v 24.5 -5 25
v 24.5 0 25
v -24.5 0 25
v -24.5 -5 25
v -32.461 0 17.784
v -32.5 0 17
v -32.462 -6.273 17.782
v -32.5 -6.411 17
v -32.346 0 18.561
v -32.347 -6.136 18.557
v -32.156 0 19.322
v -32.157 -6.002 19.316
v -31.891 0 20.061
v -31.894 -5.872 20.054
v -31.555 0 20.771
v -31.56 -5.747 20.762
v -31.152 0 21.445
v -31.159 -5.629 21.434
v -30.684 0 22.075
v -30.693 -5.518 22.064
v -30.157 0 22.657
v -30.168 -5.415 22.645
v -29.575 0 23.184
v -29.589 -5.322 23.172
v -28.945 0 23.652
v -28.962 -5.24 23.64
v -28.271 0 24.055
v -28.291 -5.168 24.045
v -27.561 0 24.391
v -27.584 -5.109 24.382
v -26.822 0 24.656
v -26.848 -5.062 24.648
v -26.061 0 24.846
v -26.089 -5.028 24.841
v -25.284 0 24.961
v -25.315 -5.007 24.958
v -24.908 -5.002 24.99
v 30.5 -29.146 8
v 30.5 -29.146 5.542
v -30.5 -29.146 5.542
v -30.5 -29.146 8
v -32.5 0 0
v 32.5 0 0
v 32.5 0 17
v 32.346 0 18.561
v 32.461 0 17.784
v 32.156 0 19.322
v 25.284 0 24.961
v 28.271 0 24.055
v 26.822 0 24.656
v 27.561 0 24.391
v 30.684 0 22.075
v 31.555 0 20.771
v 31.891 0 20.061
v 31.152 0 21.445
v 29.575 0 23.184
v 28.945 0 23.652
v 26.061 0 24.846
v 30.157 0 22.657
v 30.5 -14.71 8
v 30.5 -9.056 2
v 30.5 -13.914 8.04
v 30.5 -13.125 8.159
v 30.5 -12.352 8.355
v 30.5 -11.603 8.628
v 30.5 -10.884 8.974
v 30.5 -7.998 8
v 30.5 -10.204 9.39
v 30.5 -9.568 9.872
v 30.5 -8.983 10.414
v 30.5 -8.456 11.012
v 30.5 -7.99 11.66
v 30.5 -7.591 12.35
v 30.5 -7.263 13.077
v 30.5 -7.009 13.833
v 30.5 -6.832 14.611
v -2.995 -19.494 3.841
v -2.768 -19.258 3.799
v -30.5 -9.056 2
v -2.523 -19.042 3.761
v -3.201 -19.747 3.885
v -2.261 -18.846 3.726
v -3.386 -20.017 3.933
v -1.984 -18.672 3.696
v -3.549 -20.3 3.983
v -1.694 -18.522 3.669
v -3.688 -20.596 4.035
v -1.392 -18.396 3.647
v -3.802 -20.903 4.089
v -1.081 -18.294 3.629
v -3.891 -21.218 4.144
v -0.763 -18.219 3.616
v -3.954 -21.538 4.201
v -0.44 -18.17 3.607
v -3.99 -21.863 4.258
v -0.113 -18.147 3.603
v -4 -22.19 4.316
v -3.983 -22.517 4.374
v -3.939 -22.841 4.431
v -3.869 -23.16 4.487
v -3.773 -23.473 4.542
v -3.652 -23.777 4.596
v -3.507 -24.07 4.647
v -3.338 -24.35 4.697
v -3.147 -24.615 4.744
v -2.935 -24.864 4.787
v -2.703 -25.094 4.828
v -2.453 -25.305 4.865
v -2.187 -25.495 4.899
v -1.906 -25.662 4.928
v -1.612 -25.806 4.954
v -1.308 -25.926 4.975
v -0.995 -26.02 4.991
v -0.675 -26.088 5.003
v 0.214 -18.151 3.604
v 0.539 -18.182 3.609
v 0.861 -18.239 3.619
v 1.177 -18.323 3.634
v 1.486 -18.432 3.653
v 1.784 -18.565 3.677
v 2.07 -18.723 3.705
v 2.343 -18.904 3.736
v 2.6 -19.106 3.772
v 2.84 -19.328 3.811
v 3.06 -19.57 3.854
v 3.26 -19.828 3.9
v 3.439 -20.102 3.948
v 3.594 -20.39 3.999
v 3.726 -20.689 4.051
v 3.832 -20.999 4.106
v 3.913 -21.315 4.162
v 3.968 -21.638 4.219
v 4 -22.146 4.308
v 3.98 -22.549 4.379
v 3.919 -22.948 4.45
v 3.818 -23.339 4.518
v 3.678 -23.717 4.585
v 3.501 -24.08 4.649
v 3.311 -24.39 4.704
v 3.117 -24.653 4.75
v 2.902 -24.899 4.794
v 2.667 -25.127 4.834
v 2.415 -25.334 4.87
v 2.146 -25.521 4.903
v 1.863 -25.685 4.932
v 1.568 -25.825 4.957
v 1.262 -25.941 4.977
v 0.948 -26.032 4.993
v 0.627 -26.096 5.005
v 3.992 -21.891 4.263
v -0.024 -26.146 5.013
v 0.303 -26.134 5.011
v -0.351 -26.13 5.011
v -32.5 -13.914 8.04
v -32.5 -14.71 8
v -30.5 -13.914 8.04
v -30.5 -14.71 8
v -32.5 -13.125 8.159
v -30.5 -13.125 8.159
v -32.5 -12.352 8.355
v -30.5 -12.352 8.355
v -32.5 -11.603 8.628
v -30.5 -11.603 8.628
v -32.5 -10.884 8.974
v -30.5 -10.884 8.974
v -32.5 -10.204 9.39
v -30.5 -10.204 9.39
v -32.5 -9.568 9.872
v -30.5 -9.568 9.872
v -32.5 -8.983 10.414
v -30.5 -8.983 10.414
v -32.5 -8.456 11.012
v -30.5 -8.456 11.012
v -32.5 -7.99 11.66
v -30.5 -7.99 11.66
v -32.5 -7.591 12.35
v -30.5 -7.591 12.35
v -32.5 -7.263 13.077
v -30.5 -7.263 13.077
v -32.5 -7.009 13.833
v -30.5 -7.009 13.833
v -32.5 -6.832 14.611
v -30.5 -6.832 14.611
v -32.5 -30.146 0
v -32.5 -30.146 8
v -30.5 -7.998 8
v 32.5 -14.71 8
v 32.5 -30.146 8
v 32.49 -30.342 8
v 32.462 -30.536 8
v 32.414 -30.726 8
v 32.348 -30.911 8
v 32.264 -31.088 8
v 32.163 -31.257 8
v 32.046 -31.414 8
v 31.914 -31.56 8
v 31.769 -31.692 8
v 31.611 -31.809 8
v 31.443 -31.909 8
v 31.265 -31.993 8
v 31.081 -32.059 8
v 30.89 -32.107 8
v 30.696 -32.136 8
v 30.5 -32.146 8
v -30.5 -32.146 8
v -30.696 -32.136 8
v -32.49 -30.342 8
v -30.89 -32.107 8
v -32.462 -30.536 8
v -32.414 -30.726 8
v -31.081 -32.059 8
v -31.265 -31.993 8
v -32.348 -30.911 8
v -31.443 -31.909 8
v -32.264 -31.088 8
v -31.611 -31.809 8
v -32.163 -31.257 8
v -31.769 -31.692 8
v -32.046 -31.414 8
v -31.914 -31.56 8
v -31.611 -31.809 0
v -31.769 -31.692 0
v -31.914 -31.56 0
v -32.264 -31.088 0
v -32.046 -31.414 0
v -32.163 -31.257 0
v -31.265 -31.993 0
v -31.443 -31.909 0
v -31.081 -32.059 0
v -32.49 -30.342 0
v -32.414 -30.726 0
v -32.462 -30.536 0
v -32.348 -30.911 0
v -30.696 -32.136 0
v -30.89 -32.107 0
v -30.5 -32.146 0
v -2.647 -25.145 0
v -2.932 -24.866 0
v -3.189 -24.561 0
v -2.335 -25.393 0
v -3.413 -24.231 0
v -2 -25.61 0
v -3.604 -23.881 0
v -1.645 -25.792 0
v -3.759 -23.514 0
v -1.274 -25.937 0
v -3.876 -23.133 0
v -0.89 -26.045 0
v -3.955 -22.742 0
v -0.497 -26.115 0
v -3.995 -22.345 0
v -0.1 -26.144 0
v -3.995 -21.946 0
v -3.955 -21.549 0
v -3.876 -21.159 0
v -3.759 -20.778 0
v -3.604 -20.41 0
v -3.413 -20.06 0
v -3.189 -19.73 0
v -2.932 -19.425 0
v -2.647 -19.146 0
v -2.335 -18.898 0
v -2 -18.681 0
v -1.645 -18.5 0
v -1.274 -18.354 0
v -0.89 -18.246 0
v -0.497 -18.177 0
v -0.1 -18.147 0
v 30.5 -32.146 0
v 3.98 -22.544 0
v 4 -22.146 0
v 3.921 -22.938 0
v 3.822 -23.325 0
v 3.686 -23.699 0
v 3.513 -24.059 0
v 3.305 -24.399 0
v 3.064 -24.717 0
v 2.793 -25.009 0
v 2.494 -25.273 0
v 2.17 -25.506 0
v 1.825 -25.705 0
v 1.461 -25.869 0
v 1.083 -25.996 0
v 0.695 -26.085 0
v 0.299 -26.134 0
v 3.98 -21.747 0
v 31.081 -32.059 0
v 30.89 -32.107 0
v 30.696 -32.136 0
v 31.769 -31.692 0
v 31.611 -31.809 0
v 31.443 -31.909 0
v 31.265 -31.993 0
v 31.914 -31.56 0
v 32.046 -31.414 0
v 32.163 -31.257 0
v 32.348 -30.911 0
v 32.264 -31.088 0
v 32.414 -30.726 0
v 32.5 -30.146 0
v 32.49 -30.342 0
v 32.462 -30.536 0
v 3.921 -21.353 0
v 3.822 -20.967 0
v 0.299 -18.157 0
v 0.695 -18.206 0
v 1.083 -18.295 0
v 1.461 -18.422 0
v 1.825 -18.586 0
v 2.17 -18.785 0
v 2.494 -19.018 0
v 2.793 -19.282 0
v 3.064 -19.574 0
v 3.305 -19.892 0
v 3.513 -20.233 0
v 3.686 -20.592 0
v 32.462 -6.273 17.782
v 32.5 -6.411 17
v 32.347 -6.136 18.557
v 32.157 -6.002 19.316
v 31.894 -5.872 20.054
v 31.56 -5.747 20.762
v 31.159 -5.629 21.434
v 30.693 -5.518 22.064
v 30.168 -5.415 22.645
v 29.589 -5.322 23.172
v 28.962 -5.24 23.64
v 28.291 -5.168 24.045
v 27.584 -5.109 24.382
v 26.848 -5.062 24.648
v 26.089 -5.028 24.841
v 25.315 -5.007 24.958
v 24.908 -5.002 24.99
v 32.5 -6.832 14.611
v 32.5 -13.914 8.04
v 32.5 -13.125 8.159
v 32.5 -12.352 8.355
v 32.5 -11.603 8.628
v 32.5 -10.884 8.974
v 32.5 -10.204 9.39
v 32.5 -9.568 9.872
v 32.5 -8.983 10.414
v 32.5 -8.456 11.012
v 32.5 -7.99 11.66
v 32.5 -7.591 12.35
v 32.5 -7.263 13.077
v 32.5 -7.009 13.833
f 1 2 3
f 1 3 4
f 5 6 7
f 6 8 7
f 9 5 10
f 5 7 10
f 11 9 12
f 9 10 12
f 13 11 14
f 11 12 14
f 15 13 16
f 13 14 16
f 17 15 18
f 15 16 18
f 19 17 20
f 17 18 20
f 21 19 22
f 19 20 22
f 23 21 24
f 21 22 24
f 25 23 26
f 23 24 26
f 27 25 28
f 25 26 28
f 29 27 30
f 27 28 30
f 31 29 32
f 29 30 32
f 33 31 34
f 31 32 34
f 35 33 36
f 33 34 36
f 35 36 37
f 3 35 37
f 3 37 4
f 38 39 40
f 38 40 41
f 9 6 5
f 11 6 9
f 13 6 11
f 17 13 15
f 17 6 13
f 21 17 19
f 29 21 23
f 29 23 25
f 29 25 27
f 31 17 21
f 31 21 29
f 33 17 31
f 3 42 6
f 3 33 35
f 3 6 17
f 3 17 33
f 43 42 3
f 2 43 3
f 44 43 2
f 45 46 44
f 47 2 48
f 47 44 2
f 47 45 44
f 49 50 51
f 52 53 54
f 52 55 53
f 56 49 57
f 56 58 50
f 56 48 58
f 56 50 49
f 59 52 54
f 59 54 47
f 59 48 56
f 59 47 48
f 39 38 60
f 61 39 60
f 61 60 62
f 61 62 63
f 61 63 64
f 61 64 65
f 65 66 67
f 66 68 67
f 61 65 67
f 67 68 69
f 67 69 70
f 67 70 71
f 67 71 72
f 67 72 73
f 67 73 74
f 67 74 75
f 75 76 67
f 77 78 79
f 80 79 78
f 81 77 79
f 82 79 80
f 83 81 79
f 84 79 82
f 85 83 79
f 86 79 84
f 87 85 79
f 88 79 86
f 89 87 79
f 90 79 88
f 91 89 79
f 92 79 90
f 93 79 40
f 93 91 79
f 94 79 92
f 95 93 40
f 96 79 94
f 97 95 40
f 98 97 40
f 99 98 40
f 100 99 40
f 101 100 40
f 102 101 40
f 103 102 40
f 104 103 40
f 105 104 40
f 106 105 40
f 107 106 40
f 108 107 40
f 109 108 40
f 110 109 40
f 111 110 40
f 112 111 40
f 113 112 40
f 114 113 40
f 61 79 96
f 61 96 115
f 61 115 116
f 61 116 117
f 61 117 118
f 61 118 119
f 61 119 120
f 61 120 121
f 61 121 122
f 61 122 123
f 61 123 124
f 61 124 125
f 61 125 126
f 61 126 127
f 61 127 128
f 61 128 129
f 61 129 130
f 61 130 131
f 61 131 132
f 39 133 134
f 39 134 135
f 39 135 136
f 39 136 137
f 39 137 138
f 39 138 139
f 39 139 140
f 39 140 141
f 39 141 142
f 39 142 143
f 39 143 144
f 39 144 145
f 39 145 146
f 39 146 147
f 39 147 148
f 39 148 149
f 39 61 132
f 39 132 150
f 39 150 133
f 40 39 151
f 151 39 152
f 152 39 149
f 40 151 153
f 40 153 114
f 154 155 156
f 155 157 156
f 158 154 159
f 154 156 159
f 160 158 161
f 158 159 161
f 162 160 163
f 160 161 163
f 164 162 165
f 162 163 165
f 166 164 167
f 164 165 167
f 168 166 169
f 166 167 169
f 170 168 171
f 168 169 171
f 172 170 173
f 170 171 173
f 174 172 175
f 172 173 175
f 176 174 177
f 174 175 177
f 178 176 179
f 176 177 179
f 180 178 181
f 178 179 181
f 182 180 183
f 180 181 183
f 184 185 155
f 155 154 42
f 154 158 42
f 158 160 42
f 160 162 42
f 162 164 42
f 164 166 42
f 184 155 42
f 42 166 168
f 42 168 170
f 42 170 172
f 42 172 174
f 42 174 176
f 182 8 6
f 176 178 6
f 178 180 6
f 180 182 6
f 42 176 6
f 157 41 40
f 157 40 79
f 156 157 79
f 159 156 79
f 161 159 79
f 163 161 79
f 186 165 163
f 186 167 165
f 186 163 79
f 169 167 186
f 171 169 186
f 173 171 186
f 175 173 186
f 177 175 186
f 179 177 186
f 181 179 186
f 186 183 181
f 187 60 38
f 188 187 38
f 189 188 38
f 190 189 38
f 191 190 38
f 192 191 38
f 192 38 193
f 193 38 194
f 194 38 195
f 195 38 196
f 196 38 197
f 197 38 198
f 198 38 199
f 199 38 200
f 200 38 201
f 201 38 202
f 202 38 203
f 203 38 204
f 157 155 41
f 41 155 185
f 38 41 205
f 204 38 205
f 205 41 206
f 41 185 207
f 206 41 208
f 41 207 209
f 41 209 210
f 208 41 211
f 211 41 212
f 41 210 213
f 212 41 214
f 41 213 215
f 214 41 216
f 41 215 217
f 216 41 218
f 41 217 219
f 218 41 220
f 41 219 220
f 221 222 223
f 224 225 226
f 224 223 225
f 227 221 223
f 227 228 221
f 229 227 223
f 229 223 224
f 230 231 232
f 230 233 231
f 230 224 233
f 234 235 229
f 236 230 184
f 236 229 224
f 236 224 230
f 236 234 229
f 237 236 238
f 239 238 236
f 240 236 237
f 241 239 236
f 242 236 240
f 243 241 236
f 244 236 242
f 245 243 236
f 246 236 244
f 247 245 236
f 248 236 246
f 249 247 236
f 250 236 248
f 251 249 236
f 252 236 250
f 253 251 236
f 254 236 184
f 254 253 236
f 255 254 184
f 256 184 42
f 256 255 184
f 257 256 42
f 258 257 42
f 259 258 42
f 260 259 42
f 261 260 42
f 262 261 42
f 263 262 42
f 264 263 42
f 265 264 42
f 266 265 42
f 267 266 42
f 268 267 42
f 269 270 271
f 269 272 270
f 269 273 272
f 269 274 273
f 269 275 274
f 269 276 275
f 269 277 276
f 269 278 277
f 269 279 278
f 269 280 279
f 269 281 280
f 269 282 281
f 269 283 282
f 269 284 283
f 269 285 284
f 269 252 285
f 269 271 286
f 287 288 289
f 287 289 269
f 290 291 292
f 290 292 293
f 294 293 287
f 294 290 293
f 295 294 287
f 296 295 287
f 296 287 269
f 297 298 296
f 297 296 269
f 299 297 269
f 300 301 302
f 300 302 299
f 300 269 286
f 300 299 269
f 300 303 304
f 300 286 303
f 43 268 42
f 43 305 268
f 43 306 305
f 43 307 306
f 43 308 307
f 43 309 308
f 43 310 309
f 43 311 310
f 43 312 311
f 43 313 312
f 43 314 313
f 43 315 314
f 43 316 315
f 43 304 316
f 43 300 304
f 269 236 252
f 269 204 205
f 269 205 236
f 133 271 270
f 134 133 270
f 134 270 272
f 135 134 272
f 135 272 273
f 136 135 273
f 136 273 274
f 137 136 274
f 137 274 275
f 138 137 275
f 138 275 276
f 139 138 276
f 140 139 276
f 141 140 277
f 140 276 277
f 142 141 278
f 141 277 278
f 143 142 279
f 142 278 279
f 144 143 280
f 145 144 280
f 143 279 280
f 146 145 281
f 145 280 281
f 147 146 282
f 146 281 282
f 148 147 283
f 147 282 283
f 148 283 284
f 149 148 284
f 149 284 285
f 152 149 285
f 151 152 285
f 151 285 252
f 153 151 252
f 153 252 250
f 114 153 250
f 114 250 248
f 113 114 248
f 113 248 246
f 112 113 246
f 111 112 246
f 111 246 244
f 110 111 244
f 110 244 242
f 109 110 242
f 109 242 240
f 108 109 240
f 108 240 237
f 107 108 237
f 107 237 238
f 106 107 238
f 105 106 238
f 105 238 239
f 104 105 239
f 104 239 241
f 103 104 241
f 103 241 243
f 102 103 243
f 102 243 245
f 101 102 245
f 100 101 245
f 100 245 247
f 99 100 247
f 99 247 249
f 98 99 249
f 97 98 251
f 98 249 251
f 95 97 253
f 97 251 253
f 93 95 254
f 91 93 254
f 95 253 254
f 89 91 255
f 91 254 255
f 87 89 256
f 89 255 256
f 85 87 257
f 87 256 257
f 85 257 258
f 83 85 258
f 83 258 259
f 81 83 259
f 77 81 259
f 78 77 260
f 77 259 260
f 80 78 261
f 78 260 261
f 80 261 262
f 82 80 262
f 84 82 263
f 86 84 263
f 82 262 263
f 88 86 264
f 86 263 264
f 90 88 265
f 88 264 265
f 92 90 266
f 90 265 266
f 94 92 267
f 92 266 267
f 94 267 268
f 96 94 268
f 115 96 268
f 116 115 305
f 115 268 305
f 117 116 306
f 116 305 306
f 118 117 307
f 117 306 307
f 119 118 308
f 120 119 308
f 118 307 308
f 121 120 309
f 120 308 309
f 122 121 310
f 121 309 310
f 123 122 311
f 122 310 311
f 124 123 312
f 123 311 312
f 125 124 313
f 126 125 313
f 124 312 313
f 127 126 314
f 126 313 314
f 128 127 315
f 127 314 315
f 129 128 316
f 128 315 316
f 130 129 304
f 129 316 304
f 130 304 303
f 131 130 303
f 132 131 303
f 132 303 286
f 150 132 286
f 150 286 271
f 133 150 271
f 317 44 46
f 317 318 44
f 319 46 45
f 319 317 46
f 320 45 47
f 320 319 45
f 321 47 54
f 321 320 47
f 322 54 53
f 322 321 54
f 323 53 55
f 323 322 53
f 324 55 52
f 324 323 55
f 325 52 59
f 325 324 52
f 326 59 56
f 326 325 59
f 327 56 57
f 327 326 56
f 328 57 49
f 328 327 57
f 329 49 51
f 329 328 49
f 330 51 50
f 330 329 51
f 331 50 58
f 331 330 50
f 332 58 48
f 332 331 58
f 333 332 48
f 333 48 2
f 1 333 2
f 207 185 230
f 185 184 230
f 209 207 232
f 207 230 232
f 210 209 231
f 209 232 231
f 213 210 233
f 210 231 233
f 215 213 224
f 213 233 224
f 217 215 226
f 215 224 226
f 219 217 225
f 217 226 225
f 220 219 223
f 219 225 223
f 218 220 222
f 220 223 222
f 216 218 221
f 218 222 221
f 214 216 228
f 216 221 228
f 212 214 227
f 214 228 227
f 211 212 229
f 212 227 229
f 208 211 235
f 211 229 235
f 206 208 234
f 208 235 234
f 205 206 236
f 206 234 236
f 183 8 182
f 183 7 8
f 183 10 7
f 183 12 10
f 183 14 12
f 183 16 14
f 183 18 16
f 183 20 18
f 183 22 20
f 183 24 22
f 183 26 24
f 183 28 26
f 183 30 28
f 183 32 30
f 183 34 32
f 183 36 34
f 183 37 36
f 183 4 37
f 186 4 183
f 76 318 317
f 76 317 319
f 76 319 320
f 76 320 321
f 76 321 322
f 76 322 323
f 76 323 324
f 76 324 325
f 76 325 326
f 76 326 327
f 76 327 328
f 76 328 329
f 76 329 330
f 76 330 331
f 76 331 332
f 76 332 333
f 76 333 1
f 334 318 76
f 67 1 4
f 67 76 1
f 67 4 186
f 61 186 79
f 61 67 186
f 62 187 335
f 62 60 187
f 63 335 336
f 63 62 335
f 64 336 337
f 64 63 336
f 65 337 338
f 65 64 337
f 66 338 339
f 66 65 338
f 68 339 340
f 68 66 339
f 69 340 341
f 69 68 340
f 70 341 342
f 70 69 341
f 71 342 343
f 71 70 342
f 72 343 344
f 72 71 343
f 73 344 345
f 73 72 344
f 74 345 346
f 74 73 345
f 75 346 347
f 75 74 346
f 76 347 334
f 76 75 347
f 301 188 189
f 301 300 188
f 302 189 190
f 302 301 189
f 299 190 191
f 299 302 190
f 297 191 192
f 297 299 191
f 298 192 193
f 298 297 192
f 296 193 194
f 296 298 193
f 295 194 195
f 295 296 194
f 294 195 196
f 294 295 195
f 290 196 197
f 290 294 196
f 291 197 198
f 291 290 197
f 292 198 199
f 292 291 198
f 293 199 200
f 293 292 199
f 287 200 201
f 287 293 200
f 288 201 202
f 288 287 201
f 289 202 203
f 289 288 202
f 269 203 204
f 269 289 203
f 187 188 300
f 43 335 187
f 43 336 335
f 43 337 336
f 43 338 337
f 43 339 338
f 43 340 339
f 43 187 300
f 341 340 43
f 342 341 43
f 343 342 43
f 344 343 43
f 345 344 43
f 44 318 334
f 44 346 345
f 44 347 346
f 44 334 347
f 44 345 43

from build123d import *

# Parameters (mm, degrees)
F1_DEPTH = 32.5
F3_DEPTH = 2
F4_R     = 8
F5_R     = 2
F7_R     = 4
F8_DEPTH = 5.0144418823


with BuildPart() as f1:
    # F0 (on Right) → F1 (new body)
    with BuildSketch(Plane.YZ):
        Polygon((-32.1455987177, 8), (-32.1455987177, 0), (0, 0), (0, 25), (-5, 25), (-9.0555205563, 2), (-29.1455987177, 5.5424228244), (-29.1455987177, 8), align=None)
    extrude(amount=F1_DEPTH)

    # F2 (on face) → F3 (join)
    with BuildSketch(Plane.YZ.offset(32.5)):
        Polygon((-7.997558672, 8), (-29.1455987177, 8), (-29.1455987177, 5.5424228244), (-9.0555205563, 2), align=None)
    extrude(amount=-F3_DEPTH)

    # F4
    f4_edges = [f1.edges().sort_by_distance(p)[0] for p in [
        (31.5, -7.997559, 8),
        (32.5, -2.5, 25),
    ]]
    fillet(f4_edges, radius=F4_R)

    # F5
    f5_edges = [f1.edges().sort_by_distance(p)[0] for p in [
        (32.5, -32.145599, 4),
    ]]
    fillet(f5_edges, radius=F5_R)

    # F6: F1 across plane


with BuildPart() as f1_1:
    add(f1.part)
    add(f1.part.mirror(Plane.YZ))

    # F7 (on face) → F8 (cut, through all)
    with BuildSketch(Plane(origin=(0, 0, 0), x_dir=(1, 0, 0), z_dir=(0, 0, -1))):
        with Locations((0, 22.1455987177)):
            Circle(F7_R)
    extrude(amount=-F8_DEPTH, mode=Mode.SUBTRACT)


solid = f1_1.part
